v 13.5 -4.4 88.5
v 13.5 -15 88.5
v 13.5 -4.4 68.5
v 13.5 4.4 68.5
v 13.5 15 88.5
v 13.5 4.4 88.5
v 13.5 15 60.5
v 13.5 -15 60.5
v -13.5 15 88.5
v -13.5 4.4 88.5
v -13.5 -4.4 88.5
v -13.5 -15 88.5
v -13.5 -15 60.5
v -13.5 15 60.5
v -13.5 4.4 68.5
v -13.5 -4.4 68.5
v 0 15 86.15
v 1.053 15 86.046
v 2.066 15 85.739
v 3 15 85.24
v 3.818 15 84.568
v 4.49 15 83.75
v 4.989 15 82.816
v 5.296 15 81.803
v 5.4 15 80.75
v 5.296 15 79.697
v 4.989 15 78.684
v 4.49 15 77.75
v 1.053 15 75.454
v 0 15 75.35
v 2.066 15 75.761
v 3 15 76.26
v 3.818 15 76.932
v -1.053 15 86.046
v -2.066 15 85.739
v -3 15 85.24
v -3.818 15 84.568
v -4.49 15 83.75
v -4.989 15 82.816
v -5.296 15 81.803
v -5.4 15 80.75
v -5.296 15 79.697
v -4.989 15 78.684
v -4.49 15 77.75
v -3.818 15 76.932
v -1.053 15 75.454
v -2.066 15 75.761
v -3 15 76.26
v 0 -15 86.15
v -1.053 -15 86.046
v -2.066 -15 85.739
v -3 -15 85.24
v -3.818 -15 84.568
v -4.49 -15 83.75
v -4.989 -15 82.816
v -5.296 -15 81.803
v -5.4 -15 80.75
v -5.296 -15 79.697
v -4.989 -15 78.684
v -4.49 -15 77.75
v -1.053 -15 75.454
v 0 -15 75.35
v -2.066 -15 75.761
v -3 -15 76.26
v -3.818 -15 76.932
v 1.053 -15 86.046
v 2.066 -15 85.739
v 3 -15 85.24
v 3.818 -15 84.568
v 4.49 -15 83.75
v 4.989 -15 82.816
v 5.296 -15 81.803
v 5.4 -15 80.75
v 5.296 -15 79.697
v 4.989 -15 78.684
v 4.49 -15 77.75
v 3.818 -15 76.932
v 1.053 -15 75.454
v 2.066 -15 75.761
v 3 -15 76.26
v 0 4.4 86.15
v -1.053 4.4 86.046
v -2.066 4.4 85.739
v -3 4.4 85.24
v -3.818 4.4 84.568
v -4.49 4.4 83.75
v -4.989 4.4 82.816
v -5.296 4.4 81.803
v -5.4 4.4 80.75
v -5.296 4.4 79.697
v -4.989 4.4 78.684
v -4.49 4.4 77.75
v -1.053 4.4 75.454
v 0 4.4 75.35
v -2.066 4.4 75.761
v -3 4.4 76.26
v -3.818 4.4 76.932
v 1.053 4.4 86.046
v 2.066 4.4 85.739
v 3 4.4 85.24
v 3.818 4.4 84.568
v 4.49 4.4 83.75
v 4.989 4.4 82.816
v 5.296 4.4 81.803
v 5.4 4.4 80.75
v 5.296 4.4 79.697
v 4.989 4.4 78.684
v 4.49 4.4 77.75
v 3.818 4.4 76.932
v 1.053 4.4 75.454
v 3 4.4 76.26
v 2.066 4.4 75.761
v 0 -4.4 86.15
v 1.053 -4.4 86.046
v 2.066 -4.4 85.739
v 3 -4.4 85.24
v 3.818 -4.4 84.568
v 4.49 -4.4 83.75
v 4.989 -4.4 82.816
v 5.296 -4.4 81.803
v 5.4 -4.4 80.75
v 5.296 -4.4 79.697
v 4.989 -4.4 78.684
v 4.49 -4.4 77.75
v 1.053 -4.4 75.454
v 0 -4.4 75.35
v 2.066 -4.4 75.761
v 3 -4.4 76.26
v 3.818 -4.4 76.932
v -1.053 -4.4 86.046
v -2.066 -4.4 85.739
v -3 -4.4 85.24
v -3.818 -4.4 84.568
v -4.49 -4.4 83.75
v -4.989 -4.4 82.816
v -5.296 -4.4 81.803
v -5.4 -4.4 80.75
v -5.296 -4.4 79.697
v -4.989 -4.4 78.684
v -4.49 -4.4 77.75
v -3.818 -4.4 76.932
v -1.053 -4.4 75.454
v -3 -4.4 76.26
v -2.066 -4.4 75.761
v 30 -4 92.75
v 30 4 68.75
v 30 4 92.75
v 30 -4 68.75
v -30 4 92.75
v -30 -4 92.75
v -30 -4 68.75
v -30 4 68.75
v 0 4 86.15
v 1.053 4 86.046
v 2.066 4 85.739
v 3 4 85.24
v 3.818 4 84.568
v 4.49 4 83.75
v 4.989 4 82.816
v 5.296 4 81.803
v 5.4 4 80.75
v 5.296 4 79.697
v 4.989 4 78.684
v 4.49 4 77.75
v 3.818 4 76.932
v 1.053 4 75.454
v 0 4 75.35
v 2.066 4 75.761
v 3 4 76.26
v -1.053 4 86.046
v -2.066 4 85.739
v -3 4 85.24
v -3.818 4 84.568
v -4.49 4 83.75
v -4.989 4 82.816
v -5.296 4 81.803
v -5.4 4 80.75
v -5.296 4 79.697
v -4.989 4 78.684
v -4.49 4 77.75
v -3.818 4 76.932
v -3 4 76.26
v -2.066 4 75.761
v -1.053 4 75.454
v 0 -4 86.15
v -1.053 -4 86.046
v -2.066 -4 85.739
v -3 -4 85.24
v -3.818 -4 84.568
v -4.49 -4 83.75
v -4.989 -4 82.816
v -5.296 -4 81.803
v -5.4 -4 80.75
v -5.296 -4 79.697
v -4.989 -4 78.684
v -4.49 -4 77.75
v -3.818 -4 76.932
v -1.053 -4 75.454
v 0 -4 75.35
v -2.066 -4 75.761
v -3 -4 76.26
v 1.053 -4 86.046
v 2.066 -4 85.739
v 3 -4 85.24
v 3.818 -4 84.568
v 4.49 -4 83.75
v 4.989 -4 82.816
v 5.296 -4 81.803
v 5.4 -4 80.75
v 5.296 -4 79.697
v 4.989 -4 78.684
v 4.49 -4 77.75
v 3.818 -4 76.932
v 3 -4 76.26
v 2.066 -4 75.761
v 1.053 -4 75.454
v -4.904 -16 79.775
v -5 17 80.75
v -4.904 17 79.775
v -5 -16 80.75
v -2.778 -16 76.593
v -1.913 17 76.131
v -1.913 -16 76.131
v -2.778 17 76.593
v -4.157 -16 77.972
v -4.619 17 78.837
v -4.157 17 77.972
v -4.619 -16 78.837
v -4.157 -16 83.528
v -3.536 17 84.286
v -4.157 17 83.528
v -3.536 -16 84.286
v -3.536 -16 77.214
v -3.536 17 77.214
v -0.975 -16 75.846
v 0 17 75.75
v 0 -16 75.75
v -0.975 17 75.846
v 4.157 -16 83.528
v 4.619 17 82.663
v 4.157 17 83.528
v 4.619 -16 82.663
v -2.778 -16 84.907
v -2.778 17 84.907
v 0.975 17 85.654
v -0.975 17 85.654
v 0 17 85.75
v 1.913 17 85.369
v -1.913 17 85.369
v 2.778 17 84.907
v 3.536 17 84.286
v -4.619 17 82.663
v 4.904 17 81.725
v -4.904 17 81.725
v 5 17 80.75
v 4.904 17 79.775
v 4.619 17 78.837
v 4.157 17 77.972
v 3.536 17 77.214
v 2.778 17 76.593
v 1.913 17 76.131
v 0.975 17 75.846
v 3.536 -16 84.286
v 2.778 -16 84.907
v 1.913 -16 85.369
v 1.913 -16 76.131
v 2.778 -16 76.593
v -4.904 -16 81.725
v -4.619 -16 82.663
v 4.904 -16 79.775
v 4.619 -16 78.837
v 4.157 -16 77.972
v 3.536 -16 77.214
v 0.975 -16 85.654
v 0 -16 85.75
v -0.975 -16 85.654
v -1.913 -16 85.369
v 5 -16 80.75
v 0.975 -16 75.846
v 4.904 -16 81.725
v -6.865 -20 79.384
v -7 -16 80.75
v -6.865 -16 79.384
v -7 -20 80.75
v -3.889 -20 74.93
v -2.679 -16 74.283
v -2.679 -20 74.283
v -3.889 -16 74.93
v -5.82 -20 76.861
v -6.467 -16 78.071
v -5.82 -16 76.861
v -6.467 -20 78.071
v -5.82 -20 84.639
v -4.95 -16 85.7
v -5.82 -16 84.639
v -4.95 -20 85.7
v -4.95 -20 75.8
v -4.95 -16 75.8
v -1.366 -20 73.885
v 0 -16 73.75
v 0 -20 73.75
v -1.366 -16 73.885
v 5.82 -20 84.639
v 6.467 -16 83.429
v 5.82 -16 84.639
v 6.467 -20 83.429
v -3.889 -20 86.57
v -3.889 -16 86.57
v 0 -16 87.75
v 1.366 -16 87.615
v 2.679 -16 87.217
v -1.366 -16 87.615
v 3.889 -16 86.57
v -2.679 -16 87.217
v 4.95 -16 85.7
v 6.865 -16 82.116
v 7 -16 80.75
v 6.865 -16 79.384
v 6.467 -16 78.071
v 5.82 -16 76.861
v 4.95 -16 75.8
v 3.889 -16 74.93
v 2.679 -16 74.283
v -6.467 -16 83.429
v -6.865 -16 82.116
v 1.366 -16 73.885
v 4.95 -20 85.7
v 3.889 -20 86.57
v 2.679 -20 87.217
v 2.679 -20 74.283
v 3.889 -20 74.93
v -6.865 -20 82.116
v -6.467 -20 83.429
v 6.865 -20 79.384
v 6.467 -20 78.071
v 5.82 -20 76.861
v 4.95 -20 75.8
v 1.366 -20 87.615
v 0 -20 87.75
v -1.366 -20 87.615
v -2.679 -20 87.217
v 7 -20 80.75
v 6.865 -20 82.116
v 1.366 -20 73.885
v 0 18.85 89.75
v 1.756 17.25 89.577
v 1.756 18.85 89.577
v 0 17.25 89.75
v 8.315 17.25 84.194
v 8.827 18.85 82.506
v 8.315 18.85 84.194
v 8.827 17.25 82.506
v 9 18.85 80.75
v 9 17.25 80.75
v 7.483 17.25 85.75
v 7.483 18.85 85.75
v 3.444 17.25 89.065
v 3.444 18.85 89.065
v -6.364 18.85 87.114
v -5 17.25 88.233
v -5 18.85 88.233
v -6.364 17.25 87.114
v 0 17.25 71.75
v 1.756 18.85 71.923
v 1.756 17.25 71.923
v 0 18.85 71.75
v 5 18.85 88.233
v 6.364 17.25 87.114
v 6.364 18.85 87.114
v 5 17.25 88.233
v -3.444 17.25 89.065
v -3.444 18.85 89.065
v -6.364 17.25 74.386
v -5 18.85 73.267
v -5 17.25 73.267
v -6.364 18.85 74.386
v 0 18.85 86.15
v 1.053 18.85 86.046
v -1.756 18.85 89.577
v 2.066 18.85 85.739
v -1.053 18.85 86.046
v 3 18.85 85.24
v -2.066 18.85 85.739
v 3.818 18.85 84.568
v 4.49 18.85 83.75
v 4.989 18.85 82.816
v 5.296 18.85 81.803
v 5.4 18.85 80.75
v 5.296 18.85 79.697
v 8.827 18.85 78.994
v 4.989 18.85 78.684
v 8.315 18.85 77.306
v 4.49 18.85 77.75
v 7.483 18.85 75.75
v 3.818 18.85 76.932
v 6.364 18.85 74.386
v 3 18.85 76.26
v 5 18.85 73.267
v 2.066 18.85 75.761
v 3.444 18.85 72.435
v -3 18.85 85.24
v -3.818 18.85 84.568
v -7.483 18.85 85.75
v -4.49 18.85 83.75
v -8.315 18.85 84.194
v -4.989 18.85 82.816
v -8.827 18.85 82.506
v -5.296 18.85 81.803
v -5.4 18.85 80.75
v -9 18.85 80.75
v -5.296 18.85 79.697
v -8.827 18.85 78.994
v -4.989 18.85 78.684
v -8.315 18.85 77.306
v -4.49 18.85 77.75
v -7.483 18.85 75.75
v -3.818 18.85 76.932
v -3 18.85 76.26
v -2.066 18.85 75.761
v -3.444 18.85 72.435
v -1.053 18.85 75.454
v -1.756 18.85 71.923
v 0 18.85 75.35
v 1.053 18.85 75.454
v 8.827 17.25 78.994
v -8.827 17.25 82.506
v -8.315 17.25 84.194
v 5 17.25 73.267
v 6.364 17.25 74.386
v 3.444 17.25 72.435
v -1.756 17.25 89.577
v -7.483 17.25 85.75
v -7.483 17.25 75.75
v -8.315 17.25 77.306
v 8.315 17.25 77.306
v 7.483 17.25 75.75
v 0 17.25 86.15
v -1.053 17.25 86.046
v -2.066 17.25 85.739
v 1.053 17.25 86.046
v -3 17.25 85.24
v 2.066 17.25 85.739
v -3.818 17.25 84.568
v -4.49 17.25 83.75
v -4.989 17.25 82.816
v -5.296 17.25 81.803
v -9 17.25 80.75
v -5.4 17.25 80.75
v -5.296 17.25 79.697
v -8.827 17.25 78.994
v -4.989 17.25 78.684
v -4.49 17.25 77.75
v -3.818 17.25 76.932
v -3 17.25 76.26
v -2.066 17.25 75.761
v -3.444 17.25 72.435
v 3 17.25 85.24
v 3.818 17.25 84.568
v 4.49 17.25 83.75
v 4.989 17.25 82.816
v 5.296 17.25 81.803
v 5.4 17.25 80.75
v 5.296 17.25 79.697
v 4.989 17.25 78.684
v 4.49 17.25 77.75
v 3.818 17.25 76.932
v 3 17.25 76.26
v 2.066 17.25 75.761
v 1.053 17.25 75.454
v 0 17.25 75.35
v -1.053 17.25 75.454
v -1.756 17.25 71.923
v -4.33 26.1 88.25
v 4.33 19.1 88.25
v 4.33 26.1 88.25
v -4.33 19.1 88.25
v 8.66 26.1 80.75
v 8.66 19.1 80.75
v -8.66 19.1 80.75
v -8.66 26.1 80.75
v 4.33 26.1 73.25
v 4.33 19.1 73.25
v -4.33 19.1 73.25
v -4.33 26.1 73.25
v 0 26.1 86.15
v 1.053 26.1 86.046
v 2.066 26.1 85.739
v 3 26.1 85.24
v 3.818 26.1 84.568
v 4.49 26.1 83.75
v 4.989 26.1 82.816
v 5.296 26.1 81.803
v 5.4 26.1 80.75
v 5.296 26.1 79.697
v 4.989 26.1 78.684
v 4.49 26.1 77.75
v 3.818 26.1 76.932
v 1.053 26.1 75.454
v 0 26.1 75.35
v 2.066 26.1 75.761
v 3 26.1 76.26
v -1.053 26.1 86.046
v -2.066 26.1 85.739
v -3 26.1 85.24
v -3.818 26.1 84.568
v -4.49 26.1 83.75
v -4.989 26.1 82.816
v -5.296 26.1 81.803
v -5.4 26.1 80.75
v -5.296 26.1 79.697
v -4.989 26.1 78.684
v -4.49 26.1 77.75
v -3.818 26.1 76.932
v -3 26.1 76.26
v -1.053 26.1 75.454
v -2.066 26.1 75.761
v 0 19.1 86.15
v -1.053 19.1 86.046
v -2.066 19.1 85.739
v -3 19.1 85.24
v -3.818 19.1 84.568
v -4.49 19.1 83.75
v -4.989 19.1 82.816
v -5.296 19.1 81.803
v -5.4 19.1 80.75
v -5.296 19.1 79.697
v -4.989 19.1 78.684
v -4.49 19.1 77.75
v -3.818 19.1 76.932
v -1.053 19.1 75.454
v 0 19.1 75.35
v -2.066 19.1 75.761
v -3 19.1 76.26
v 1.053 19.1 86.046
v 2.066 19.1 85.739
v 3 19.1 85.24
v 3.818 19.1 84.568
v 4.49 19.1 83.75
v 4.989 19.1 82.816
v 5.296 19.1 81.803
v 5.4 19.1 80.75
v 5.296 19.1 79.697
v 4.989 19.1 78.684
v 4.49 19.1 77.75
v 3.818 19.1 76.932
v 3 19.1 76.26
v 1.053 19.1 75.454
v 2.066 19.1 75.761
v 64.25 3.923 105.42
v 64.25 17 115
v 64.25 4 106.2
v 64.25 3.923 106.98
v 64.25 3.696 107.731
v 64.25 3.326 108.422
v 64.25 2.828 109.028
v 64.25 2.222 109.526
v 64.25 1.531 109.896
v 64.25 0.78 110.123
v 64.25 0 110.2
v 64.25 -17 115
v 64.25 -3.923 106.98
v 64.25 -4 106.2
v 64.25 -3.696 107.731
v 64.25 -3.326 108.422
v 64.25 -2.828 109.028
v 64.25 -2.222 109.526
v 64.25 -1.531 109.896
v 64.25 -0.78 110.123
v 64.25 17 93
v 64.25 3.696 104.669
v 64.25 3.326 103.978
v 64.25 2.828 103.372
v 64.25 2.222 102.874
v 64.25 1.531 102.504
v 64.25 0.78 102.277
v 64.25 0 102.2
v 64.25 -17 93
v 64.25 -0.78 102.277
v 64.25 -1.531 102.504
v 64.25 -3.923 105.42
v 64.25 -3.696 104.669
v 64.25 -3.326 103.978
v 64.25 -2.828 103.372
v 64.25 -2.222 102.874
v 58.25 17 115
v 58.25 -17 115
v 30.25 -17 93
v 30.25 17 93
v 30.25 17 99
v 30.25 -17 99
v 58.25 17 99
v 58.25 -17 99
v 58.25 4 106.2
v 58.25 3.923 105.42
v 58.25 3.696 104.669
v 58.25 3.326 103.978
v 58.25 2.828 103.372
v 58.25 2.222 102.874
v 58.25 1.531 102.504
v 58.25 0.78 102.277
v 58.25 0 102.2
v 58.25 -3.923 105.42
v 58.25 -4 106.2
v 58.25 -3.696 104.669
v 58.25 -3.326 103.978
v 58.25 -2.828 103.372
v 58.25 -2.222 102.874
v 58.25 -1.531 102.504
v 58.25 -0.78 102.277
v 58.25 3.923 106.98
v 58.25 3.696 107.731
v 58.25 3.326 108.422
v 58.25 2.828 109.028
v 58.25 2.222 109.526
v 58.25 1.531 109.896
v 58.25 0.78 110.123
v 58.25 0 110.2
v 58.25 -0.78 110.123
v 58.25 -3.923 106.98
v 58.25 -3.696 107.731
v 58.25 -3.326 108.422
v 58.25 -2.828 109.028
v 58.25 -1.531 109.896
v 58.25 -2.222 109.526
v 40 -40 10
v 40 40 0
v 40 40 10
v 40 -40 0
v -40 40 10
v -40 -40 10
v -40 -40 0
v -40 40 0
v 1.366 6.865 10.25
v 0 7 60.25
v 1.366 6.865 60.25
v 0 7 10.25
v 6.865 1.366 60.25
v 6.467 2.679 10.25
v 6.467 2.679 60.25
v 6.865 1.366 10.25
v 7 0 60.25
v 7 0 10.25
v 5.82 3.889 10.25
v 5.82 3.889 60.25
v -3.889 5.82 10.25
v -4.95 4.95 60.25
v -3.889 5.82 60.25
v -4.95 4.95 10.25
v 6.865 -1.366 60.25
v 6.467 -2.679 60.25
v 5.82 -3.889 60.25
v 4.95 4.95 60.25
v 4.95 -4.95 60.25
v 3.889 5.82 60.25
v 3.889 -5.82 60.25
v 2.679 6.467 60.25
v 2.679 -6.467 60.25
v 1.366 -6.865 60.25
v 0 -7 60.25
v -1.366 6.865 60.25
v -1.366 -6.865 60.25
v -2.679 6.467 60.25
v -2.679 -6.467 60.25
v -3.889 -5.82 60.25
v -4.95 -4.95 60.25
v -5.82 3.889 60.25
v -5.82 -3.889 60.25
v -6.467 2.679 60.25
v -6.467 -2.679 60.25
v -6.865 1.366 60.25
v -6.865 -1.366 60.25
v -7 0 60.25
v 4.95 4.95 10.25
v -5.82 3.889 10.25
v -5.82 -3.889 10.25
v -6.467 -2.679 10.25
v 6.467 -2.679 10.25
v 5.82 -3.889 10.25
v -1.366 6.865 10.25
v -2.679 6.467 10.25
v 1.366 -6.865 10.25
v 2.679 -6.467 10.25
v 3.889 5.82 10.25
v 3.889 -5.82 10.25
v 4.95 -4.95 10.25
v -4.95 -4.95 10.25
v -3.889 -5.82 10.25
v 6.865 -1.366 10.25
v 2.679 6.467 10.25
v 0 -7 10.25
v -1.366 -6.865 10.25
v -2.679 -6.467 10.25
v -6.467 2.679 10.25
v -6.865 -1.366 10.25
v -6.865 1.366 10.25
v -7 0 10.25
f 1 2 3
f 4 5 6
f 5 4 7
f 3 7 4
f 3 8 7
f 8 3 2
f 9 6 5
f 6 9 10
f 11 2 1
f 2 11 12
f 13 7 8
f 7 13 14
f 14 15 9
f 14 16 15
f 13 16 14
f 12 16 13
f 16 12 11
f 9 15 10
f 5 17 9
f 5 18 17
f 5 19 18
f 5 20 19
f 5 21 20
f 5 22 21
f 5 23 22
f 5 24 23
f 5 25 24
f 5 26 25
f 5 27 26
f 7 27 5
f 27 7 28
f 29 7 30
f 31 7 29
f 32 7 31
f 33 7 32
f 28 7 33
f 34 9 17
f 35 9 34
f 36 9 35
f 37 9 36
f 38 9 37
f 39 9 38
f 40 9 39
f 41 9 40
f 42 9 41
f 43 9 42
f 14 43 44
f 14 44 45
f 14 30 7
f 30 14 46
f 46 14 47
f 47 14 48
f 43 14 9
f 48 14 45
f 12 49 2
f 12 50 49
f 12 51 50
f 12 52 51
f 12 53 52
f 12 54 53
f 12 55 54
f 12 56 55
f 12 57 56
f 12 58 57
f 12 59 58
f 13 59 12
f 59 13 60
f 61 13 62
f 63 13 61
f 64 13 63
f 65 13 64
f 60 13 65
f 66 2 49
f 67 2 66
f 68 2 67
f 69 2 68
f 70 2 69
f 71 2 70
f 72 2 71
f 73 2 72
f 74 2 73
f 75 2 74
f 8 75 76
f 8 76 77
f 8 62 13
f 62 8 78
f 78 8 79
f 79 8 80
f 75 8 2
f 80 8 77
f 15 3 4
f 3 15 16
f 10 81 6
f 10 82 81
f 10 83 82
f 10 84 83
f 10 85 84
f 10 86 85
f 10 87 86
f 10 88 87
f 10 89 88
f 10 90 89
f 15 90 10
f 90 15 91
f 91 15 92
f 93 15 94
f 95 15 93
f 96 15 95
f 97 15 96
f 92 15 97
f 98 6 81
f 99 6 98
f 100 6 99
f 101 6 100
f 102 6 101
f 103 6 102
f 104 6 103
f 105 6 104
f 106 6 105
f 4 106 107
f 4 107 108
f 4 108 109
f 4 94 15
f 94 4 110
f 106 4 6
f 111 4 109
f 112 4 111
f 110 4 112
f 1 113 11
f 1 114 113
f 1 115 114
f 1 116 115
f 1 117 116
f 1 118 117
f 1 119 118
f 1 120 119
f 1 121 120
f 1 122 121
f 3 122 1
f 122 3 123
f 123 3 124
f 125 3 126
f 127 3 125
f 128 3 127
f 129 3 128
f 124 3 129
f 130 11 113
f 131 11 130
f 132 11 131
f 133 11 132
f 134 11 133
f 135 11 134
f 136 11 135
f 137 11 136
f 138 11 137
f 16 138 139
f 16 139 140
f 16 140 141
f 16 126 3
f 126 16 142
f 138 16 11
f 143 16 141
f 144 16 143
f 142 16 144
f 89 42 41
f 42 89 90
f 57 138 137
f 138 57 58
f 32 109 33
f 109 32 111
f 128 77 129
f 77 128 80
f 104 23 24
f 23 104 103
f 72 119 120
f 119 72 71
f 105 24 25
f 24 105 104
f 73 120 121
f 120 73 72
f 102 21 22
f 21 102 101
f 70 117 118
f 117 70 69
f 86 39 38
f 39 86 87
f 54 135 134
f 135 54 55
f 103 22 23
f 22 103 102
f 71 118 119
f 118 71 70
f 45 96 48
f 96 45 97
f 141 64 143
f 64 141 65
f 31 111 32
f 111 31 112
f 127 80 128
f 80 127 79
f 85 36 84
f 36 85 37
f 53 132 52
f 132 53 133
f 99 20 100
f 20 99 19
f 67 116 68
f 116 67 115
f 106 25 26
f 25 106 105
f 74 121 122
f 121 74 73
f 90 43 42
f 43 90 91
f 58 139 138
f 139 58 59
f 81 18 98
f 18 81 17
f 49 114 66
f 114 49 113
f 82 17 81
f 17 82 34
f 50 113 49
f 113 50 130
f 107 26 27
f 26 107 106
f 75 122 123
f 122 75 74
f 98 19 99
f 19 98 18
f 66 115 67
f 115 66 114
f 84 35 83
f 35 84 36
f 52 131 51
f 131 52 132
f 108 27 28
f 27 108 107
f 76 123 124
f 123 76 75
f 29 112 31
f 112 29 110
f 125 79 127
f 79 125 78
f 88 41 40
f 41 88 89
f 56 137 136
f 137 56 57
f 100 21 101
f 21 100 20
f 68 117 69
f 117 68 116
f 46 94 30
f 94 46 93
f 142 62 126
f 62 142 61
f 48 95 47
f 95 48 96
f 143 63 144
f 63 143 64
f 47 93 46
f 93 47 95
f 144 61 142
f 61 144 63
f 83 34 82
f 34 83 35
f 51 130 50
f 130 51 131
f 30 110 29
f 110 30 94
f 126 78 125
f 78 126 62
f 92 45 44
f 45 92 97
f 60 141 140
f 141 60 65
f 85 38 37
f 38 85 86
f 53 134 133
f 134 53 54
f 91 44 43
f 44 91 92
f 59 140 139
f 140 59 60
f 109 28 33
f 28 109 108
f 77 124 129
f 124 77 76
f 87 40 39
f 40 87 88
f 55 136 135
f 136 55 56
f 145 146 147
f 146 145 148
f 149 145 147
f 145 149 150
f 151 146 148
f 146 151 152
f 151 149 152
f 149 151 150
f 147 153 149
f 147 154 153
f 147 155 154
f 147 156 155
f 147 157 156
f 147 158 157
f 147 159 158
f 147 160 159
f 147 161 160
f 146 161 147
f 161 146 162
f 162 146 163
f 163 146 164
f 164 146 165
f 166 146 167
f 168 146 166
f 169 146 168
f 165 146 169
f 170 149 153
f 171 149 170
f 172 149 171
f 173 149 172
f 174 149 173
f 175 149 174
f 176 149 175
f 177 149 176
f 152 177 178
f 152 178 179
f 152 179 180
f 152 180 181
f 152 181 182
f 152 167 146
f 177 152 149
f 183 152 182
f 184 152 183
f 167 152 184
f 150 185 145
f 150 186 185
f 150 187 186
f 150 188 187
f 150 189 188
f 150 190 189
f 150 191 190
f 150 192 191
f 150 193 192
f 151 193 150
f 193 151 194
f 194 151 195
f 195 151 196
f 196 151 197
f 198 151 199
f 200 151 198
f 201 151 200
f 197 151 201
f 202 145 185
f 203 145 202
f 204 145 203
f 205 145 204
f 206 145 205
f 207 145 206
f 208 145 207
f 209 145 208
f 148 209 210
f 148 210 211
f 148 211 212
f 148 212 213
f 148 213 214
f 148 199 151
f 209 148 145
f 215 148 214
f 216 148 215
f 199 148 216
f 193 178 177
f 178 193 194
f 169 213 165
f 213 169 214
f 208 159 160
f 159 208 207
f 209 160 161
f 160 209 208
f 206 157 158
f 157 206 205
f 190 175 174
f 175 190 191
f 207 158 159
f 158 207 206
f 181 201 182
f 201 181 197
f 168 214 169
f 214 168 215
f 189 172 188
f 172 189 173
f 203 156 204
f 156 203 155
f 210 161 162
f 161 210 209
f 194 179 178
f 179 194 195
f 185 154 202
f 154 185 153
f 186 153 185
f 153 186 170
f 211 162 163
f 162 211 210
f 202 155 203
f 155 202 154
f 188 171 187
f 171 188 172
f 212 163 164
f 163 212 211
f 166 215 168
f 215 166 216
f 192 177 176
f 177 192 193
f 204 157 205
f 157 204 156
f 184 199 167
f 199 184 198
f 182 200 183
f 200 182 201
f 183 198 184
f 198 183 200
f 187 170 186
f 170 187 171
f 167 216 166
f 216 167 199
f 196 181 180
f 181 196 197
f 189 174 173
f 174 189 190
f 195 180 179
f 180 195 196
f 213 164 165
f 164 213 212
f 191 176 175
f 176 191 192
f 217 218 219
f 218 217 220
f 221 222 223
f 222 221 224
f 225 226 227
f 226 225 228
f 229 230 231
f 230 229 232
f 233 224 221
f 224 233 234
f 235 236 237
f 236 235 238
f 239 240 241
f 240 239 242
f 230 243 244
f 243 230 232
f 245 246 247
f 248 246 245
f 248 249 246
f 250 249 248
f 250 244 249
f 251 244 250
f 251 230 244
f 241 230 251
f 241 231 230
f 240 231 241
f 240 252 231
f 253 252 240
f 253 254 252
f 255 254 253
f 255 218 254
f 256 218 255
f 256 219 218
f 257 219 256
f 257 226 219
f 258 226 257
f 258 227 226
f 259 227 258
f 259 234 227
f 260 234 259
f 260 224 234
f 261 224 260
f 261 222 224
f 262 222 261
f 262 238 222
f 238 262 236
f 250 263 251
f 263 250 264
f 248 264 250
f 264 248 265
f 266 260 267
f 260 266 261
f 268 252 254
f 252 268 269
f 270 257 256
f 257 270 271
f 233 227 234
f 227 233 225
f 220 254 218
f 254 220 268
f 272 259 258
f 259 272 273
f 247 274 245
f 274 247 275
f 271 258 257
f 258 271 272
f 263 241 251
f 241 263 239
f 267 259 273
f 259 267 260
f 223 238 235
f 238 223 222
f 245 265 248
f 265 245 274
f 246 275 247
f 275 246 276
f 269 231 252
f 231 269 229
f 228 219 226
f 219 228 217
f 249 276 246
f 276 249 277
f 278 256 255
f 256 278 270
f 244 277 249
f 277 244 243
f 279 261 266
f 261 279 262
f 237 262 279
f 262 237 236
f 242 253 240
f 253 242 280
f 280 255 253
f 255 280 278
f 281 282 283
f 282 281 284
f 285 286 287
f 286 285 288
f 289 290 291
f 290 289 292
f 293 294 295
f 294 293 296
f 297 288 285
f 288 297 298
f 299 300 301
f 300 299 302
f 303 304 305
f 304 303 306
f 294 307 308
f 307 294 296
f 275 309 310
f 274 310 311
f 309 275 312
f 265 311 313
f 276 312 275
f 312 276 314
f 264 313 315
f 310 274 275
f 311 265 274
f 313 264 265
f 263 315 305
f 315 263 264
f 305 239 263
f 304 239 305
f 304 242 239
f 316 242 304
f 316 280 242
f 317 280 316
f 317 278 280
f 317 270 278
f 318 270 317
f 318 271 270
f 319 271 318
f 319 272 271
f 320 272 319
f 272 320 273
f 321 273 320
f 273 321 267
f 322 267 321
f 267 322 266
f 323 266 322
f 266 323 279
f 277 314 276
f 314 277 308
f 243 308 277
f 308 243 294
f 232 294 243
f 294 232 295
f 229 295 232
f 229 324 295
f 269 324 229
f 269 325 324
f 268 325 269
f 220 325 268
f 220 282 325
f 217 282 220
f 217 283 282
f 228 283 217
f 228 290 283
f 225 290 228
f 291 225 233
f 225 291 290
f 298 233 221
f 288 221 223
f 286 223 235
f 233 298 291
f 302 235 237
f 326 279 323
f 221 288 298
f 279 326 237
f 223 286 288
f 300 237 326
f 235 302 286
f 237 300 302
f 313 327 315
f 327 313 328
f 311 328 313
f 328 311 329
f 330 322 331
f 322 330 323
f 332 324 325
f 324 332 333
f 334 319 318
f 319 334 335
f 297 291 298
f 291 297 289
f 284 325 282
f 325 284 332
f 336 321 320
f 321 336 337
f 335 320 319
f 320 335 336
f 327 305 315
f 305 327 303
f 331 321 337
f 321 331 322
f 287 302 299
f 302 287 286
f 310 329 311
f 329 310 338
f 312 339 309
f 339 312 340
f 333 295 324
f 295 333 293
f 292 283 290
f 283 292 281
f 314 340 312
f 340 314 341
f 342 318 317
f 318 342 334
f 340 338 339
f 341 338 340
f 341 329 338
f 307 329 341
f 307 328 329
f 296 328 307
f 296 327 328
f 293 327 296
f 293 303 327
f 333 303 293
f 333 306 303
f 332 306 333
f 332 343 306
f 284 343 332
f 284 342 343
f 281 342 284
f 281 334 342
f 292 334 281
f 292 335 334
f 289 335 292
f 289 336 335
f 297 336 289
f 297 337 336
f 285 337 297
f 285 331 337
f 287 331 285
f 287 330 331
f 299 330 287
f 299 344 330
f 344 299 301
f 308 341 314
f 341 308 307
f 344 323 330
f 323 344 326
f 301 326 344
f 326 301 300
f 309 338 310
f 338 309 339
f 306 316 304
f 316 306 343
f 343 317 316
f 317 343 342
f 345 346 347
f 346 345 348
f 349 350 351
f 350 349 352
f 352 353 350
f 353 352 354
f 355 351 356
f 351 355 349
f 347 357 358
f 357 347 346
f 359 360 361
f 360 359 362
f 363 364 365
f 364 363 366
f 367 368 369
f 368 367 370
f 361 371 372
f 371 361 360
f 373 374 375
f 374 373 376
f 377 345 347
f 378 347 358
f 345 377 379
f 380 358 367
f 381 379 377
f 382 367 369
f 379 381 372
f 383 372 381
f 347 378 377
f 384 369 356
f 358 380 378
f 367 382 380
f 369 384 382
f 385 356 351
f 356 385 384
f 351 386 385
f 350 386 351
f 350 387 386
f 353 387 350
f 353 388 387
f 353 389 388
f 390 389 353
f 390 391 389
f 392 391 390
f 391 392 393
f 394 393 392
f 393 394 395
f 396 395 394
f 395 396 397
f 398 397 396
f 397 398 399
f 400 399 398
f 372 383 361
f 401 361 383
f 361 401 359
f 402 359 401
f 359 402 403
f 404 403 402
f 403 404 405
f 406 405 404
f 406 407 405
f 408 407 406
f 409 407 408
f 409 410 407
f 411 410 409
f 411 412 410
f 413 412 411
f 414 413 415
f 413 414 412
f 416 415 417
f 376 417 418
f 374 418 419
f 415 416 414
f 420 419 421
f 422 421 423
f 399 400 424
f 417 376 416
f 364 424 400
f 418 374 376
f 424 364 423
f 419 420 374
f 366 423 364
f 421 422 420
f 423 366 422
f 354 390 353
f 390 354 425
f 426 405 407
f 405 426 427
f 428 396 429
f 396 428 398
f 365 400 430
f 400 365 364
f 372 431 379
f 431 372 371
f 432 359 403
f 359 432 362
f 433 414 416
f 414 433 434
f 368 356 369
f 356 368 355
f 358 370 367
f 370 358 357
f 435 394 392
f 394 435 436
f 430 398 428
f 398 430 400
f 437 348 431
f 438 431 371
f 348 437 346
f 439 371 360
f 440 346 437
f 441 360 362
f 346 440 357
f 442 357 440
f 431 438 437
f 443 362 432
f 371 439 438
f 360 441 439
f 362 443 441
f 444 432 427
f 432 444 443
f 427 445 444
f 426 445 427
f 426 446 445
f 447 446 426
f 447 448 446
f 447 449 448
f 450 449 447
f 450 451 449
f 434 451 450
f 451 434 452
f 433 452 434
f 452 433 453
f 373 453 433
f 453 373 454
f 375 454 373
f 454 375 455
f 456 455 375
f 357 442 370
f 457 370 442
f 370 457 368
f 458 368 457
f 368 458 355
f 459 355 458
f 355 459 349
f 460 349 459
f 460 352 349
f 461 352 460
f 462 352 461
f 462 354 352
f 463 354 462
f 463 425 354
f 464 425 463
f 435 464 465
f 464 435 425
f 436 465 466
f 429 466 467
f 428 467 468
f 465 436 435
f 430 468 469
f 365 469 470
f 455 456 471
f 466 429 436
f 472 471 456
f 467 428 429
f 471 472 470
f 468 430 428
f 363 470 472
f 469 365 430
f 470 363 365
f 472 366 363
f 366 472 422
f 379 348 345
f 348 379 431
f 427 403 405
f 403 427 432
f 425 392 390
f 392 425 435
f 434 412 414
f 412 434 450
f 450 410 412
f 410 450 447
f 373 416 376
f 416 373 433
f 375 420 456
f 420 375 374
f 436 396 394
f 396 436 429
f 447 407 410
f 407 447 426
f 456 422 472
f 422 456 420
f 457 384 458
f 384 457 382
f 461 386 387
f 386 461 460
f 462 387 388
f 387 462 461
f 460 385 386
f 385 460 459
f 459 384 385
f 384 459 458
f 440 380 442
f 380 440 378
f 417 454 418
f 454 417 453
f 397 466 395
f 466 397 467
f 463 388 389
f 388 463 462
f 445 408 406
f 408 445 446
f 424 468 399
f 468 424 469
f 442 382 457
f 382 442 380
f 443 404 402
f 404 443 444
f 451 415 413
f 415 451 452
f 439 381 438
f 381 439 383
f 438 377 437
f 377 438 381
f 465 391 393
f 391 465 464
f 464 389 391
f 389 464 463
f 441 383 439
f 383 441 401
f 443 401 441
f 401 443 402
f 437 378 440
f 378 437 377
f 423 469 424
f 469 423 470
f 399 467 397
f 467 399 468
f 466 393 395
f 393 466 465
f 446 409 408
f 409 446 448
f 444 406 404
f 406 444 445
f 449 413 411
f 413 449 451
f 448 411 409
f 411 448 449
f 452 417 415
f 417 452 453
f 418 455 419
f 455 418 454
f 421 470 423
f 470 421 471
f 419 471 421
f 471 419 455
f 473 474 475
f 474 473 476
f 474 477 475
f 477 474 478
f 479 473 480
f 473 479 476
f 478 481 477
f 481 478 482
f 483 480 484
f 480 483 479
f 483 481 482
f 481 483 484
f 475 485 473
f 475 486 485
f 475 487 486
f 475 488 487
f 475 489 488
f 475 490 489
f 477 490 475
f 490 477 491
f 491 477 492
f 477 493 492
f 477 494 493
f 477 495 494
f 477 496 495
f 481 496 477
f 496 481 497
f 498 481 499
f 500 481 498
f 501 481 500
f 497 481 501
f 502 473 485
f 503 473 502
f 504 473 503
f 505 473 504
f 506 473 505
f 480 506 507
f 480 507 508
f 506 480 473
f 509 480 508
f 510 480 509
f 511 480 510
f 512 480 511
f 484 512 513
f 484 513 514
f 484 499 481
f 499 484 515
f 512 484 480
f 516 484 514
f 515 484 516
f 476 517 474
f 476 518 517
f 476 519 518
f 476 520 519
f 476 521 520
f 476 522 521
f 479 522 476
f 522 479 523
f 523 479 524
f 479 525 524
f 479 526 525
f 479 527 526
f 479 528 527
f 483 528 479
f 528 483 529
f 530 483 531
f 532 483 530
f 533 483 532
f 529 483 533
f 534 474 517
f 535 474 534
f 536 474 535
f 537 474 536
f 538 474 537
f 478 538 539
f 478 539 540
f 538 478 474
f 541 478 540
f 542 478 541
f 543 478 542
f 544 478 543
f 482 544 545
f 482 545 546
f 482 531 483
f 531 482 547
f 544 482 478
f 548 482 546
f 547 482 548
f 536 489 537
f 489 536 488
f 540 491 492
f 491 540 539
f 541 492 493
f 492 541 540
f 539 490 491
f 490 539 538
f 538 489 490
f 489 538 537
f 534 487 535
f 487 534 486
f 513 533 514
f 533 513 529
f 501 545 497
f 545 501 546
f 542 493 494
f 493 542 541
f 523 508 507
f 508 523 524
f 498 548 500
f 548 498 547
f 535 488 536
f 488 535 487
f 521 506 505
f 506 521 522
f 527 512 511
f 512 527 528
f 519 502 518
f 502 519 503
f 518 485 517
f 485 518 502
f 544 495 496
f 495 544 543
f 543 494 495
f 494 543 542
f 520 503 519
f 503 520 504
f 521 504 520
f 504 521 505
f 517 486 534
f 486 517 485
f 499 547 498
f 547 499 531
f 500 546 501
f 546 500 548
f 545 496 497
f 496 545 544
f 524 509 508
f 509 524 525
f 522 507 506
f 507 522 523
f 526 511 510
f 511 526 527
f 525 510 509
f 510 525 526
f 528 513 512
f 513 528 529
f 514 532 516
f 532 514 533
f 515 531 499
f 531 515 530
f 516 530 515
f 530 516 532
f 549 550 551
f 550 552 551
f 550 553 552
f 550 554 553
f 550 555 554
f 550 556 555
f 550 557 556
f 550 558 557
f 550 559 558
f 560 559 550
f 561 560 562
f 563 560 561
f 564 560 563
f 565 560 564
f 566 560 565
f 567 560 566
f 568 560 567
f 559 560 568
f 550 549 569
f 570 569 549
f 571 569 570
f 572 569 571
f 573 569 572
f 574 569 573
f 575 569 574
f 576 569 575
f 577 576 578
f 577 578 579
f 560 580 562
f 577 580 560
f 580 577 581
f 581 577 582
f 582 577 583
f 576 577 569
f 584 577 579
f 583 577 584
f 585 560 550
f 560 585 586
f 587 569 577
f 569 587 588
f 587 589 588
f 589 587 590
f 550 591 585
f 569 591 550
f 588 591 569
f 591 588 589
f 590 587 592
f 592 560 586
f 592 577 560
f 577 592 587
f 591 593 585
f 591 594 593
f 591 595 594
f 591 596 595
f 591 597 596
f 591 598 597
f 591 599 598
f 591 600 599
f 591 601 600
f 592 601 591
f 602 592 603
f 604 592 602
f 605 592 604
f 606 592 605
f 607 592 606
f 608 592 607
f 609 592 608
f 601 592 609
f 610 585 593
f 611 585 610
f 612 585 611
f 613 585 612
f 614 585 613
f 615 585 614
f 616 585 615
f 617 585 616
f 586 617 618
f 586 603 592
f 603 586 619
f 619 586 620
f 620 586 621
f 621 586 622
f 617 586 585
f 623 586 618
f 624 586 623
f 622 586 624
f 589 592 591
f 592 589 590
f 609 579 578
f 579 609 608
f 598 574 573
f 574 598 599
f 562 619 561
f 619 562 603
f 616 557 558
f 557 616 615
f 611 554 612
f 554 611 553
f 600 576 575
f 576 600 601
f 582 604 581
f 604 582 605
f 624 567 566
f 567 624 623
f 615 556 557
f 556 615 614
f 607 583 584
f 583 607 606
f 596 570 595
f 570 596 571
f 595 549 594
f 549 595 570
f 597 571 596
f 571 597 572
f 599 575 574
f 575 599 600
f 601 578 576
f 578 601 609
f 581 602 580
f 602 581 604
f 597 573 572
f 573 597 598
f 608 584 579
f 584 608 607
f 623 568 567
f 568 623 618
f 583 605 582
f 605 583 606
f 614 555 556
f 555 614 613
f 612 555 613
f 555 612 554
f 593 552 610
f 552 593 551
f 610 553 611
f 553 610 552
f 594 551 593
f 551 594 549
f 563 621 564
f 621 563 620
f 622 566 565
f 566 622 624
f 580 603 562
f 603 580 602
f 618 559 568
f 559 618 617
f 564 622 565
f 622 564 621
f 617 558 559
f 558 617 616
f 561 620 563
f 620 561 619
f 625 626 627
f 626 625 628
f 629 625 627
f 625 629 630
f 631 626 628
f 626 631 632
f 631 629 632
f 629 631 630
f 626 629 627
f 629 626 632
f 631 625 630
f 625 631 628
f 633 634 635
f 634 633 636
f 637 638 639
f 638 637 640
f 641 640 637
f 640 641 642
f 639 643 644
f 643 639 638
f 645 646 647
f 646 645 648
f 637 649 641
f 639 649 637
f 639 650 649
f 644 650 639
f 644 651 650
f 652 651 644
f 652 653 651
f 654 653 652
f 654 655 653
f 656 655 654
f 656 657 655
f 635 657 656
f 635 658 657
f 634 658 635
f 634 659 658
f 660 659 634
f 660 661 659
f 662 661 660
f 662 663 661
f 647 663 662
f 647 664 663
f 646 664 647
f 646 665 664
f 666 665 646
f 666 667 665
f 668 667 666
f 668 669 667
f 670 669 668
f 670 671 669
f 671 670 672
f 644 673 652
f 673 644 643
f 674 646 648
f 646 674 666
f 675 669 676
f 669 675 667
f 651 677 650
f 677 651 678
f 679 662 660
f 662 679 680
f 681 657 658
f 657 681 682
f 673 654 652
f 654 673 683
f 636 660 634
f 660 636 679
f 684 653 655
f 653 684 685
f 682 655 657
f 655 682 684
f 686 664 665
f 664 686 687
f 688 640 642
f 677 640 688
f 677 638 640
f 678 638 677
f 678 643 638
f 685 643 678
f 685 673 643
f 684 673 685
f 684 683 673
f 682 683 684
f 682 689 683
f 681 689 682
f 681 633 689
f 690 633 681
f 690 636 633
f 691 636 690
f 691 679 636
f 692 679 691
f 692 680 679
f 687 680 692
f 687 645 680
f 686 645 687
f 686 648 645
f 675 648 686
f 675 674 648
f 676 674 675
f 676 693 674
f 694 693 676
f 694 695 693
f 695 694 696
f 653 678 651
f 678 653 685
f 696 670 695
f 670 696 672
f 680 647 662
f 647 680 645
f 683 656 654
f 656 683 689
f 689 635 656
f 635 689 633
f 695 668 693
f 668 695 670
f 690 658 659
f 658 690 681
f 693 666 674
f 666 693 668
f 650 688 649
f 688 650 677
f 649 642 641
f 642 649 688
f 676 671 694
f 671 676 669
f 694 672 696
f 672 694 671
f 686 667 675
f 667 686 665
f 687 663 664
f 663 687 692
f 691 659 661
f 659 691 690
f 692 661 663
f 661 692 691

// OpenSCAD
$fn = 32;

// ------------------------------------------------------------------------
// Lamp arm: column d14 x 50 mm, arm 60 mm
// Every part is its own module, assembly() places every instance.
// ------------------------------------------------------------------------

// --- part 1 ---
module lamp_base() {
  difference() {
    translate([-40, -40, 0]) cube([80, 80, 10]);
  }
}

// --- part 2 ---
module lamp_column() {
  cylinder(h = 50, d = 14);
}

// --- part 3 ---
module head_fork() {
  difference() {
    translate([-13.5, -15, 0]) cube([27, 30, 28]);
    translate([-14.5, -4.4, 8]) cube([29, 8.8, 21]);
    translate([0, 0, 20.25]) rotate([90, 0, 0]) cylinder(h = 32, d = 10.8, center = true);
  }
}

// --- part 4 ---
module lamp_arm() {
  difference() {
    translate([-30, -4, 0]) cube([60, 8, 24]);
    translate([0, 0, 12]) rotate([90, 0, 0]) cylinder(h = 10, d = 10.8, center = true);
  }
}

// --- part 5 ---
module arm_pin() {
  rotate([0, 90, 0]) cylinder(h = 34, d = 10, center = true);
  translate([-20, 0, 0]) rotate([0, 90, 0]) cylinder(h = 4, d = 14);
}

// --- part 6 ---
module arm_washer() {
  difference() {
      translate([0, 0, 0]) cylinder(h = 1.6, d = 18);
      translate([0, 0, -1]) cylinder(h = 3.6, d = 10.8);
    }
}

// --- part 7 ---
module arm_nut() {
  difference() {
    linear_extrude(height = 7) polygon(points = [[8.66, 0], [4.33, 7.5], [-4.33, 7.5], [-8.66, 0], [-4.33, -7.5], [4.33, -7.5]]);
    translate([0, 0, -1]) cylinder(h = 9, d = 10.8);
  }
}

// --- part 8 ---
module shade_bracket() {
  difference() {
    translate([-17, -17, 0]) cube([34, 34, 22]);
    translate([-18, -18, 6]) cube([29, 36, 17]);
    translate([14, 0, 13.2]) rotate([0, 90, 0]) cylinder(h = 8, d = 8, center = true);
  }
}

// --- assembly ---
module assembly() {
  color([0.80, 0.24, 0.20]) translate([0, 0, 0]) rotate([0, 0, 0]) lamp_base();
  color([0.20, 0.45, 0.75]) translate([0, 0, 10.25]) rotate([0, 0, 0]) lamp_column();
  color([0.25, 0.62, 0.32]) translate([0, 0, 60.5]) rotate([0, 0, 0]) head_fork();
  color([0.92, 0.70, 0.18]) translate([0, 0, 68.75]) rotate([0, 0, 0]) lamp_arm();
  color([0.58, 0.35, 0.70]) translate([0, 0, 80.75]) rotate([0, 0, 90]) arm_pin();
  color([0.16, 0.66, 0.66]) translate([0, 18.85, 80.75]) rotate([90, 0, 0]) arm_washer();
  color([0.85, 0.48, 0.18]) translate([0, 26.1, 80.75]) rotate([90, 0, 0]) arm_nut();
  color([0.55, 0.60, 0.65]) translate([47.25, 0, 93]) rotate([0, 0, 0]) shade_bracket();
}

assembly();
